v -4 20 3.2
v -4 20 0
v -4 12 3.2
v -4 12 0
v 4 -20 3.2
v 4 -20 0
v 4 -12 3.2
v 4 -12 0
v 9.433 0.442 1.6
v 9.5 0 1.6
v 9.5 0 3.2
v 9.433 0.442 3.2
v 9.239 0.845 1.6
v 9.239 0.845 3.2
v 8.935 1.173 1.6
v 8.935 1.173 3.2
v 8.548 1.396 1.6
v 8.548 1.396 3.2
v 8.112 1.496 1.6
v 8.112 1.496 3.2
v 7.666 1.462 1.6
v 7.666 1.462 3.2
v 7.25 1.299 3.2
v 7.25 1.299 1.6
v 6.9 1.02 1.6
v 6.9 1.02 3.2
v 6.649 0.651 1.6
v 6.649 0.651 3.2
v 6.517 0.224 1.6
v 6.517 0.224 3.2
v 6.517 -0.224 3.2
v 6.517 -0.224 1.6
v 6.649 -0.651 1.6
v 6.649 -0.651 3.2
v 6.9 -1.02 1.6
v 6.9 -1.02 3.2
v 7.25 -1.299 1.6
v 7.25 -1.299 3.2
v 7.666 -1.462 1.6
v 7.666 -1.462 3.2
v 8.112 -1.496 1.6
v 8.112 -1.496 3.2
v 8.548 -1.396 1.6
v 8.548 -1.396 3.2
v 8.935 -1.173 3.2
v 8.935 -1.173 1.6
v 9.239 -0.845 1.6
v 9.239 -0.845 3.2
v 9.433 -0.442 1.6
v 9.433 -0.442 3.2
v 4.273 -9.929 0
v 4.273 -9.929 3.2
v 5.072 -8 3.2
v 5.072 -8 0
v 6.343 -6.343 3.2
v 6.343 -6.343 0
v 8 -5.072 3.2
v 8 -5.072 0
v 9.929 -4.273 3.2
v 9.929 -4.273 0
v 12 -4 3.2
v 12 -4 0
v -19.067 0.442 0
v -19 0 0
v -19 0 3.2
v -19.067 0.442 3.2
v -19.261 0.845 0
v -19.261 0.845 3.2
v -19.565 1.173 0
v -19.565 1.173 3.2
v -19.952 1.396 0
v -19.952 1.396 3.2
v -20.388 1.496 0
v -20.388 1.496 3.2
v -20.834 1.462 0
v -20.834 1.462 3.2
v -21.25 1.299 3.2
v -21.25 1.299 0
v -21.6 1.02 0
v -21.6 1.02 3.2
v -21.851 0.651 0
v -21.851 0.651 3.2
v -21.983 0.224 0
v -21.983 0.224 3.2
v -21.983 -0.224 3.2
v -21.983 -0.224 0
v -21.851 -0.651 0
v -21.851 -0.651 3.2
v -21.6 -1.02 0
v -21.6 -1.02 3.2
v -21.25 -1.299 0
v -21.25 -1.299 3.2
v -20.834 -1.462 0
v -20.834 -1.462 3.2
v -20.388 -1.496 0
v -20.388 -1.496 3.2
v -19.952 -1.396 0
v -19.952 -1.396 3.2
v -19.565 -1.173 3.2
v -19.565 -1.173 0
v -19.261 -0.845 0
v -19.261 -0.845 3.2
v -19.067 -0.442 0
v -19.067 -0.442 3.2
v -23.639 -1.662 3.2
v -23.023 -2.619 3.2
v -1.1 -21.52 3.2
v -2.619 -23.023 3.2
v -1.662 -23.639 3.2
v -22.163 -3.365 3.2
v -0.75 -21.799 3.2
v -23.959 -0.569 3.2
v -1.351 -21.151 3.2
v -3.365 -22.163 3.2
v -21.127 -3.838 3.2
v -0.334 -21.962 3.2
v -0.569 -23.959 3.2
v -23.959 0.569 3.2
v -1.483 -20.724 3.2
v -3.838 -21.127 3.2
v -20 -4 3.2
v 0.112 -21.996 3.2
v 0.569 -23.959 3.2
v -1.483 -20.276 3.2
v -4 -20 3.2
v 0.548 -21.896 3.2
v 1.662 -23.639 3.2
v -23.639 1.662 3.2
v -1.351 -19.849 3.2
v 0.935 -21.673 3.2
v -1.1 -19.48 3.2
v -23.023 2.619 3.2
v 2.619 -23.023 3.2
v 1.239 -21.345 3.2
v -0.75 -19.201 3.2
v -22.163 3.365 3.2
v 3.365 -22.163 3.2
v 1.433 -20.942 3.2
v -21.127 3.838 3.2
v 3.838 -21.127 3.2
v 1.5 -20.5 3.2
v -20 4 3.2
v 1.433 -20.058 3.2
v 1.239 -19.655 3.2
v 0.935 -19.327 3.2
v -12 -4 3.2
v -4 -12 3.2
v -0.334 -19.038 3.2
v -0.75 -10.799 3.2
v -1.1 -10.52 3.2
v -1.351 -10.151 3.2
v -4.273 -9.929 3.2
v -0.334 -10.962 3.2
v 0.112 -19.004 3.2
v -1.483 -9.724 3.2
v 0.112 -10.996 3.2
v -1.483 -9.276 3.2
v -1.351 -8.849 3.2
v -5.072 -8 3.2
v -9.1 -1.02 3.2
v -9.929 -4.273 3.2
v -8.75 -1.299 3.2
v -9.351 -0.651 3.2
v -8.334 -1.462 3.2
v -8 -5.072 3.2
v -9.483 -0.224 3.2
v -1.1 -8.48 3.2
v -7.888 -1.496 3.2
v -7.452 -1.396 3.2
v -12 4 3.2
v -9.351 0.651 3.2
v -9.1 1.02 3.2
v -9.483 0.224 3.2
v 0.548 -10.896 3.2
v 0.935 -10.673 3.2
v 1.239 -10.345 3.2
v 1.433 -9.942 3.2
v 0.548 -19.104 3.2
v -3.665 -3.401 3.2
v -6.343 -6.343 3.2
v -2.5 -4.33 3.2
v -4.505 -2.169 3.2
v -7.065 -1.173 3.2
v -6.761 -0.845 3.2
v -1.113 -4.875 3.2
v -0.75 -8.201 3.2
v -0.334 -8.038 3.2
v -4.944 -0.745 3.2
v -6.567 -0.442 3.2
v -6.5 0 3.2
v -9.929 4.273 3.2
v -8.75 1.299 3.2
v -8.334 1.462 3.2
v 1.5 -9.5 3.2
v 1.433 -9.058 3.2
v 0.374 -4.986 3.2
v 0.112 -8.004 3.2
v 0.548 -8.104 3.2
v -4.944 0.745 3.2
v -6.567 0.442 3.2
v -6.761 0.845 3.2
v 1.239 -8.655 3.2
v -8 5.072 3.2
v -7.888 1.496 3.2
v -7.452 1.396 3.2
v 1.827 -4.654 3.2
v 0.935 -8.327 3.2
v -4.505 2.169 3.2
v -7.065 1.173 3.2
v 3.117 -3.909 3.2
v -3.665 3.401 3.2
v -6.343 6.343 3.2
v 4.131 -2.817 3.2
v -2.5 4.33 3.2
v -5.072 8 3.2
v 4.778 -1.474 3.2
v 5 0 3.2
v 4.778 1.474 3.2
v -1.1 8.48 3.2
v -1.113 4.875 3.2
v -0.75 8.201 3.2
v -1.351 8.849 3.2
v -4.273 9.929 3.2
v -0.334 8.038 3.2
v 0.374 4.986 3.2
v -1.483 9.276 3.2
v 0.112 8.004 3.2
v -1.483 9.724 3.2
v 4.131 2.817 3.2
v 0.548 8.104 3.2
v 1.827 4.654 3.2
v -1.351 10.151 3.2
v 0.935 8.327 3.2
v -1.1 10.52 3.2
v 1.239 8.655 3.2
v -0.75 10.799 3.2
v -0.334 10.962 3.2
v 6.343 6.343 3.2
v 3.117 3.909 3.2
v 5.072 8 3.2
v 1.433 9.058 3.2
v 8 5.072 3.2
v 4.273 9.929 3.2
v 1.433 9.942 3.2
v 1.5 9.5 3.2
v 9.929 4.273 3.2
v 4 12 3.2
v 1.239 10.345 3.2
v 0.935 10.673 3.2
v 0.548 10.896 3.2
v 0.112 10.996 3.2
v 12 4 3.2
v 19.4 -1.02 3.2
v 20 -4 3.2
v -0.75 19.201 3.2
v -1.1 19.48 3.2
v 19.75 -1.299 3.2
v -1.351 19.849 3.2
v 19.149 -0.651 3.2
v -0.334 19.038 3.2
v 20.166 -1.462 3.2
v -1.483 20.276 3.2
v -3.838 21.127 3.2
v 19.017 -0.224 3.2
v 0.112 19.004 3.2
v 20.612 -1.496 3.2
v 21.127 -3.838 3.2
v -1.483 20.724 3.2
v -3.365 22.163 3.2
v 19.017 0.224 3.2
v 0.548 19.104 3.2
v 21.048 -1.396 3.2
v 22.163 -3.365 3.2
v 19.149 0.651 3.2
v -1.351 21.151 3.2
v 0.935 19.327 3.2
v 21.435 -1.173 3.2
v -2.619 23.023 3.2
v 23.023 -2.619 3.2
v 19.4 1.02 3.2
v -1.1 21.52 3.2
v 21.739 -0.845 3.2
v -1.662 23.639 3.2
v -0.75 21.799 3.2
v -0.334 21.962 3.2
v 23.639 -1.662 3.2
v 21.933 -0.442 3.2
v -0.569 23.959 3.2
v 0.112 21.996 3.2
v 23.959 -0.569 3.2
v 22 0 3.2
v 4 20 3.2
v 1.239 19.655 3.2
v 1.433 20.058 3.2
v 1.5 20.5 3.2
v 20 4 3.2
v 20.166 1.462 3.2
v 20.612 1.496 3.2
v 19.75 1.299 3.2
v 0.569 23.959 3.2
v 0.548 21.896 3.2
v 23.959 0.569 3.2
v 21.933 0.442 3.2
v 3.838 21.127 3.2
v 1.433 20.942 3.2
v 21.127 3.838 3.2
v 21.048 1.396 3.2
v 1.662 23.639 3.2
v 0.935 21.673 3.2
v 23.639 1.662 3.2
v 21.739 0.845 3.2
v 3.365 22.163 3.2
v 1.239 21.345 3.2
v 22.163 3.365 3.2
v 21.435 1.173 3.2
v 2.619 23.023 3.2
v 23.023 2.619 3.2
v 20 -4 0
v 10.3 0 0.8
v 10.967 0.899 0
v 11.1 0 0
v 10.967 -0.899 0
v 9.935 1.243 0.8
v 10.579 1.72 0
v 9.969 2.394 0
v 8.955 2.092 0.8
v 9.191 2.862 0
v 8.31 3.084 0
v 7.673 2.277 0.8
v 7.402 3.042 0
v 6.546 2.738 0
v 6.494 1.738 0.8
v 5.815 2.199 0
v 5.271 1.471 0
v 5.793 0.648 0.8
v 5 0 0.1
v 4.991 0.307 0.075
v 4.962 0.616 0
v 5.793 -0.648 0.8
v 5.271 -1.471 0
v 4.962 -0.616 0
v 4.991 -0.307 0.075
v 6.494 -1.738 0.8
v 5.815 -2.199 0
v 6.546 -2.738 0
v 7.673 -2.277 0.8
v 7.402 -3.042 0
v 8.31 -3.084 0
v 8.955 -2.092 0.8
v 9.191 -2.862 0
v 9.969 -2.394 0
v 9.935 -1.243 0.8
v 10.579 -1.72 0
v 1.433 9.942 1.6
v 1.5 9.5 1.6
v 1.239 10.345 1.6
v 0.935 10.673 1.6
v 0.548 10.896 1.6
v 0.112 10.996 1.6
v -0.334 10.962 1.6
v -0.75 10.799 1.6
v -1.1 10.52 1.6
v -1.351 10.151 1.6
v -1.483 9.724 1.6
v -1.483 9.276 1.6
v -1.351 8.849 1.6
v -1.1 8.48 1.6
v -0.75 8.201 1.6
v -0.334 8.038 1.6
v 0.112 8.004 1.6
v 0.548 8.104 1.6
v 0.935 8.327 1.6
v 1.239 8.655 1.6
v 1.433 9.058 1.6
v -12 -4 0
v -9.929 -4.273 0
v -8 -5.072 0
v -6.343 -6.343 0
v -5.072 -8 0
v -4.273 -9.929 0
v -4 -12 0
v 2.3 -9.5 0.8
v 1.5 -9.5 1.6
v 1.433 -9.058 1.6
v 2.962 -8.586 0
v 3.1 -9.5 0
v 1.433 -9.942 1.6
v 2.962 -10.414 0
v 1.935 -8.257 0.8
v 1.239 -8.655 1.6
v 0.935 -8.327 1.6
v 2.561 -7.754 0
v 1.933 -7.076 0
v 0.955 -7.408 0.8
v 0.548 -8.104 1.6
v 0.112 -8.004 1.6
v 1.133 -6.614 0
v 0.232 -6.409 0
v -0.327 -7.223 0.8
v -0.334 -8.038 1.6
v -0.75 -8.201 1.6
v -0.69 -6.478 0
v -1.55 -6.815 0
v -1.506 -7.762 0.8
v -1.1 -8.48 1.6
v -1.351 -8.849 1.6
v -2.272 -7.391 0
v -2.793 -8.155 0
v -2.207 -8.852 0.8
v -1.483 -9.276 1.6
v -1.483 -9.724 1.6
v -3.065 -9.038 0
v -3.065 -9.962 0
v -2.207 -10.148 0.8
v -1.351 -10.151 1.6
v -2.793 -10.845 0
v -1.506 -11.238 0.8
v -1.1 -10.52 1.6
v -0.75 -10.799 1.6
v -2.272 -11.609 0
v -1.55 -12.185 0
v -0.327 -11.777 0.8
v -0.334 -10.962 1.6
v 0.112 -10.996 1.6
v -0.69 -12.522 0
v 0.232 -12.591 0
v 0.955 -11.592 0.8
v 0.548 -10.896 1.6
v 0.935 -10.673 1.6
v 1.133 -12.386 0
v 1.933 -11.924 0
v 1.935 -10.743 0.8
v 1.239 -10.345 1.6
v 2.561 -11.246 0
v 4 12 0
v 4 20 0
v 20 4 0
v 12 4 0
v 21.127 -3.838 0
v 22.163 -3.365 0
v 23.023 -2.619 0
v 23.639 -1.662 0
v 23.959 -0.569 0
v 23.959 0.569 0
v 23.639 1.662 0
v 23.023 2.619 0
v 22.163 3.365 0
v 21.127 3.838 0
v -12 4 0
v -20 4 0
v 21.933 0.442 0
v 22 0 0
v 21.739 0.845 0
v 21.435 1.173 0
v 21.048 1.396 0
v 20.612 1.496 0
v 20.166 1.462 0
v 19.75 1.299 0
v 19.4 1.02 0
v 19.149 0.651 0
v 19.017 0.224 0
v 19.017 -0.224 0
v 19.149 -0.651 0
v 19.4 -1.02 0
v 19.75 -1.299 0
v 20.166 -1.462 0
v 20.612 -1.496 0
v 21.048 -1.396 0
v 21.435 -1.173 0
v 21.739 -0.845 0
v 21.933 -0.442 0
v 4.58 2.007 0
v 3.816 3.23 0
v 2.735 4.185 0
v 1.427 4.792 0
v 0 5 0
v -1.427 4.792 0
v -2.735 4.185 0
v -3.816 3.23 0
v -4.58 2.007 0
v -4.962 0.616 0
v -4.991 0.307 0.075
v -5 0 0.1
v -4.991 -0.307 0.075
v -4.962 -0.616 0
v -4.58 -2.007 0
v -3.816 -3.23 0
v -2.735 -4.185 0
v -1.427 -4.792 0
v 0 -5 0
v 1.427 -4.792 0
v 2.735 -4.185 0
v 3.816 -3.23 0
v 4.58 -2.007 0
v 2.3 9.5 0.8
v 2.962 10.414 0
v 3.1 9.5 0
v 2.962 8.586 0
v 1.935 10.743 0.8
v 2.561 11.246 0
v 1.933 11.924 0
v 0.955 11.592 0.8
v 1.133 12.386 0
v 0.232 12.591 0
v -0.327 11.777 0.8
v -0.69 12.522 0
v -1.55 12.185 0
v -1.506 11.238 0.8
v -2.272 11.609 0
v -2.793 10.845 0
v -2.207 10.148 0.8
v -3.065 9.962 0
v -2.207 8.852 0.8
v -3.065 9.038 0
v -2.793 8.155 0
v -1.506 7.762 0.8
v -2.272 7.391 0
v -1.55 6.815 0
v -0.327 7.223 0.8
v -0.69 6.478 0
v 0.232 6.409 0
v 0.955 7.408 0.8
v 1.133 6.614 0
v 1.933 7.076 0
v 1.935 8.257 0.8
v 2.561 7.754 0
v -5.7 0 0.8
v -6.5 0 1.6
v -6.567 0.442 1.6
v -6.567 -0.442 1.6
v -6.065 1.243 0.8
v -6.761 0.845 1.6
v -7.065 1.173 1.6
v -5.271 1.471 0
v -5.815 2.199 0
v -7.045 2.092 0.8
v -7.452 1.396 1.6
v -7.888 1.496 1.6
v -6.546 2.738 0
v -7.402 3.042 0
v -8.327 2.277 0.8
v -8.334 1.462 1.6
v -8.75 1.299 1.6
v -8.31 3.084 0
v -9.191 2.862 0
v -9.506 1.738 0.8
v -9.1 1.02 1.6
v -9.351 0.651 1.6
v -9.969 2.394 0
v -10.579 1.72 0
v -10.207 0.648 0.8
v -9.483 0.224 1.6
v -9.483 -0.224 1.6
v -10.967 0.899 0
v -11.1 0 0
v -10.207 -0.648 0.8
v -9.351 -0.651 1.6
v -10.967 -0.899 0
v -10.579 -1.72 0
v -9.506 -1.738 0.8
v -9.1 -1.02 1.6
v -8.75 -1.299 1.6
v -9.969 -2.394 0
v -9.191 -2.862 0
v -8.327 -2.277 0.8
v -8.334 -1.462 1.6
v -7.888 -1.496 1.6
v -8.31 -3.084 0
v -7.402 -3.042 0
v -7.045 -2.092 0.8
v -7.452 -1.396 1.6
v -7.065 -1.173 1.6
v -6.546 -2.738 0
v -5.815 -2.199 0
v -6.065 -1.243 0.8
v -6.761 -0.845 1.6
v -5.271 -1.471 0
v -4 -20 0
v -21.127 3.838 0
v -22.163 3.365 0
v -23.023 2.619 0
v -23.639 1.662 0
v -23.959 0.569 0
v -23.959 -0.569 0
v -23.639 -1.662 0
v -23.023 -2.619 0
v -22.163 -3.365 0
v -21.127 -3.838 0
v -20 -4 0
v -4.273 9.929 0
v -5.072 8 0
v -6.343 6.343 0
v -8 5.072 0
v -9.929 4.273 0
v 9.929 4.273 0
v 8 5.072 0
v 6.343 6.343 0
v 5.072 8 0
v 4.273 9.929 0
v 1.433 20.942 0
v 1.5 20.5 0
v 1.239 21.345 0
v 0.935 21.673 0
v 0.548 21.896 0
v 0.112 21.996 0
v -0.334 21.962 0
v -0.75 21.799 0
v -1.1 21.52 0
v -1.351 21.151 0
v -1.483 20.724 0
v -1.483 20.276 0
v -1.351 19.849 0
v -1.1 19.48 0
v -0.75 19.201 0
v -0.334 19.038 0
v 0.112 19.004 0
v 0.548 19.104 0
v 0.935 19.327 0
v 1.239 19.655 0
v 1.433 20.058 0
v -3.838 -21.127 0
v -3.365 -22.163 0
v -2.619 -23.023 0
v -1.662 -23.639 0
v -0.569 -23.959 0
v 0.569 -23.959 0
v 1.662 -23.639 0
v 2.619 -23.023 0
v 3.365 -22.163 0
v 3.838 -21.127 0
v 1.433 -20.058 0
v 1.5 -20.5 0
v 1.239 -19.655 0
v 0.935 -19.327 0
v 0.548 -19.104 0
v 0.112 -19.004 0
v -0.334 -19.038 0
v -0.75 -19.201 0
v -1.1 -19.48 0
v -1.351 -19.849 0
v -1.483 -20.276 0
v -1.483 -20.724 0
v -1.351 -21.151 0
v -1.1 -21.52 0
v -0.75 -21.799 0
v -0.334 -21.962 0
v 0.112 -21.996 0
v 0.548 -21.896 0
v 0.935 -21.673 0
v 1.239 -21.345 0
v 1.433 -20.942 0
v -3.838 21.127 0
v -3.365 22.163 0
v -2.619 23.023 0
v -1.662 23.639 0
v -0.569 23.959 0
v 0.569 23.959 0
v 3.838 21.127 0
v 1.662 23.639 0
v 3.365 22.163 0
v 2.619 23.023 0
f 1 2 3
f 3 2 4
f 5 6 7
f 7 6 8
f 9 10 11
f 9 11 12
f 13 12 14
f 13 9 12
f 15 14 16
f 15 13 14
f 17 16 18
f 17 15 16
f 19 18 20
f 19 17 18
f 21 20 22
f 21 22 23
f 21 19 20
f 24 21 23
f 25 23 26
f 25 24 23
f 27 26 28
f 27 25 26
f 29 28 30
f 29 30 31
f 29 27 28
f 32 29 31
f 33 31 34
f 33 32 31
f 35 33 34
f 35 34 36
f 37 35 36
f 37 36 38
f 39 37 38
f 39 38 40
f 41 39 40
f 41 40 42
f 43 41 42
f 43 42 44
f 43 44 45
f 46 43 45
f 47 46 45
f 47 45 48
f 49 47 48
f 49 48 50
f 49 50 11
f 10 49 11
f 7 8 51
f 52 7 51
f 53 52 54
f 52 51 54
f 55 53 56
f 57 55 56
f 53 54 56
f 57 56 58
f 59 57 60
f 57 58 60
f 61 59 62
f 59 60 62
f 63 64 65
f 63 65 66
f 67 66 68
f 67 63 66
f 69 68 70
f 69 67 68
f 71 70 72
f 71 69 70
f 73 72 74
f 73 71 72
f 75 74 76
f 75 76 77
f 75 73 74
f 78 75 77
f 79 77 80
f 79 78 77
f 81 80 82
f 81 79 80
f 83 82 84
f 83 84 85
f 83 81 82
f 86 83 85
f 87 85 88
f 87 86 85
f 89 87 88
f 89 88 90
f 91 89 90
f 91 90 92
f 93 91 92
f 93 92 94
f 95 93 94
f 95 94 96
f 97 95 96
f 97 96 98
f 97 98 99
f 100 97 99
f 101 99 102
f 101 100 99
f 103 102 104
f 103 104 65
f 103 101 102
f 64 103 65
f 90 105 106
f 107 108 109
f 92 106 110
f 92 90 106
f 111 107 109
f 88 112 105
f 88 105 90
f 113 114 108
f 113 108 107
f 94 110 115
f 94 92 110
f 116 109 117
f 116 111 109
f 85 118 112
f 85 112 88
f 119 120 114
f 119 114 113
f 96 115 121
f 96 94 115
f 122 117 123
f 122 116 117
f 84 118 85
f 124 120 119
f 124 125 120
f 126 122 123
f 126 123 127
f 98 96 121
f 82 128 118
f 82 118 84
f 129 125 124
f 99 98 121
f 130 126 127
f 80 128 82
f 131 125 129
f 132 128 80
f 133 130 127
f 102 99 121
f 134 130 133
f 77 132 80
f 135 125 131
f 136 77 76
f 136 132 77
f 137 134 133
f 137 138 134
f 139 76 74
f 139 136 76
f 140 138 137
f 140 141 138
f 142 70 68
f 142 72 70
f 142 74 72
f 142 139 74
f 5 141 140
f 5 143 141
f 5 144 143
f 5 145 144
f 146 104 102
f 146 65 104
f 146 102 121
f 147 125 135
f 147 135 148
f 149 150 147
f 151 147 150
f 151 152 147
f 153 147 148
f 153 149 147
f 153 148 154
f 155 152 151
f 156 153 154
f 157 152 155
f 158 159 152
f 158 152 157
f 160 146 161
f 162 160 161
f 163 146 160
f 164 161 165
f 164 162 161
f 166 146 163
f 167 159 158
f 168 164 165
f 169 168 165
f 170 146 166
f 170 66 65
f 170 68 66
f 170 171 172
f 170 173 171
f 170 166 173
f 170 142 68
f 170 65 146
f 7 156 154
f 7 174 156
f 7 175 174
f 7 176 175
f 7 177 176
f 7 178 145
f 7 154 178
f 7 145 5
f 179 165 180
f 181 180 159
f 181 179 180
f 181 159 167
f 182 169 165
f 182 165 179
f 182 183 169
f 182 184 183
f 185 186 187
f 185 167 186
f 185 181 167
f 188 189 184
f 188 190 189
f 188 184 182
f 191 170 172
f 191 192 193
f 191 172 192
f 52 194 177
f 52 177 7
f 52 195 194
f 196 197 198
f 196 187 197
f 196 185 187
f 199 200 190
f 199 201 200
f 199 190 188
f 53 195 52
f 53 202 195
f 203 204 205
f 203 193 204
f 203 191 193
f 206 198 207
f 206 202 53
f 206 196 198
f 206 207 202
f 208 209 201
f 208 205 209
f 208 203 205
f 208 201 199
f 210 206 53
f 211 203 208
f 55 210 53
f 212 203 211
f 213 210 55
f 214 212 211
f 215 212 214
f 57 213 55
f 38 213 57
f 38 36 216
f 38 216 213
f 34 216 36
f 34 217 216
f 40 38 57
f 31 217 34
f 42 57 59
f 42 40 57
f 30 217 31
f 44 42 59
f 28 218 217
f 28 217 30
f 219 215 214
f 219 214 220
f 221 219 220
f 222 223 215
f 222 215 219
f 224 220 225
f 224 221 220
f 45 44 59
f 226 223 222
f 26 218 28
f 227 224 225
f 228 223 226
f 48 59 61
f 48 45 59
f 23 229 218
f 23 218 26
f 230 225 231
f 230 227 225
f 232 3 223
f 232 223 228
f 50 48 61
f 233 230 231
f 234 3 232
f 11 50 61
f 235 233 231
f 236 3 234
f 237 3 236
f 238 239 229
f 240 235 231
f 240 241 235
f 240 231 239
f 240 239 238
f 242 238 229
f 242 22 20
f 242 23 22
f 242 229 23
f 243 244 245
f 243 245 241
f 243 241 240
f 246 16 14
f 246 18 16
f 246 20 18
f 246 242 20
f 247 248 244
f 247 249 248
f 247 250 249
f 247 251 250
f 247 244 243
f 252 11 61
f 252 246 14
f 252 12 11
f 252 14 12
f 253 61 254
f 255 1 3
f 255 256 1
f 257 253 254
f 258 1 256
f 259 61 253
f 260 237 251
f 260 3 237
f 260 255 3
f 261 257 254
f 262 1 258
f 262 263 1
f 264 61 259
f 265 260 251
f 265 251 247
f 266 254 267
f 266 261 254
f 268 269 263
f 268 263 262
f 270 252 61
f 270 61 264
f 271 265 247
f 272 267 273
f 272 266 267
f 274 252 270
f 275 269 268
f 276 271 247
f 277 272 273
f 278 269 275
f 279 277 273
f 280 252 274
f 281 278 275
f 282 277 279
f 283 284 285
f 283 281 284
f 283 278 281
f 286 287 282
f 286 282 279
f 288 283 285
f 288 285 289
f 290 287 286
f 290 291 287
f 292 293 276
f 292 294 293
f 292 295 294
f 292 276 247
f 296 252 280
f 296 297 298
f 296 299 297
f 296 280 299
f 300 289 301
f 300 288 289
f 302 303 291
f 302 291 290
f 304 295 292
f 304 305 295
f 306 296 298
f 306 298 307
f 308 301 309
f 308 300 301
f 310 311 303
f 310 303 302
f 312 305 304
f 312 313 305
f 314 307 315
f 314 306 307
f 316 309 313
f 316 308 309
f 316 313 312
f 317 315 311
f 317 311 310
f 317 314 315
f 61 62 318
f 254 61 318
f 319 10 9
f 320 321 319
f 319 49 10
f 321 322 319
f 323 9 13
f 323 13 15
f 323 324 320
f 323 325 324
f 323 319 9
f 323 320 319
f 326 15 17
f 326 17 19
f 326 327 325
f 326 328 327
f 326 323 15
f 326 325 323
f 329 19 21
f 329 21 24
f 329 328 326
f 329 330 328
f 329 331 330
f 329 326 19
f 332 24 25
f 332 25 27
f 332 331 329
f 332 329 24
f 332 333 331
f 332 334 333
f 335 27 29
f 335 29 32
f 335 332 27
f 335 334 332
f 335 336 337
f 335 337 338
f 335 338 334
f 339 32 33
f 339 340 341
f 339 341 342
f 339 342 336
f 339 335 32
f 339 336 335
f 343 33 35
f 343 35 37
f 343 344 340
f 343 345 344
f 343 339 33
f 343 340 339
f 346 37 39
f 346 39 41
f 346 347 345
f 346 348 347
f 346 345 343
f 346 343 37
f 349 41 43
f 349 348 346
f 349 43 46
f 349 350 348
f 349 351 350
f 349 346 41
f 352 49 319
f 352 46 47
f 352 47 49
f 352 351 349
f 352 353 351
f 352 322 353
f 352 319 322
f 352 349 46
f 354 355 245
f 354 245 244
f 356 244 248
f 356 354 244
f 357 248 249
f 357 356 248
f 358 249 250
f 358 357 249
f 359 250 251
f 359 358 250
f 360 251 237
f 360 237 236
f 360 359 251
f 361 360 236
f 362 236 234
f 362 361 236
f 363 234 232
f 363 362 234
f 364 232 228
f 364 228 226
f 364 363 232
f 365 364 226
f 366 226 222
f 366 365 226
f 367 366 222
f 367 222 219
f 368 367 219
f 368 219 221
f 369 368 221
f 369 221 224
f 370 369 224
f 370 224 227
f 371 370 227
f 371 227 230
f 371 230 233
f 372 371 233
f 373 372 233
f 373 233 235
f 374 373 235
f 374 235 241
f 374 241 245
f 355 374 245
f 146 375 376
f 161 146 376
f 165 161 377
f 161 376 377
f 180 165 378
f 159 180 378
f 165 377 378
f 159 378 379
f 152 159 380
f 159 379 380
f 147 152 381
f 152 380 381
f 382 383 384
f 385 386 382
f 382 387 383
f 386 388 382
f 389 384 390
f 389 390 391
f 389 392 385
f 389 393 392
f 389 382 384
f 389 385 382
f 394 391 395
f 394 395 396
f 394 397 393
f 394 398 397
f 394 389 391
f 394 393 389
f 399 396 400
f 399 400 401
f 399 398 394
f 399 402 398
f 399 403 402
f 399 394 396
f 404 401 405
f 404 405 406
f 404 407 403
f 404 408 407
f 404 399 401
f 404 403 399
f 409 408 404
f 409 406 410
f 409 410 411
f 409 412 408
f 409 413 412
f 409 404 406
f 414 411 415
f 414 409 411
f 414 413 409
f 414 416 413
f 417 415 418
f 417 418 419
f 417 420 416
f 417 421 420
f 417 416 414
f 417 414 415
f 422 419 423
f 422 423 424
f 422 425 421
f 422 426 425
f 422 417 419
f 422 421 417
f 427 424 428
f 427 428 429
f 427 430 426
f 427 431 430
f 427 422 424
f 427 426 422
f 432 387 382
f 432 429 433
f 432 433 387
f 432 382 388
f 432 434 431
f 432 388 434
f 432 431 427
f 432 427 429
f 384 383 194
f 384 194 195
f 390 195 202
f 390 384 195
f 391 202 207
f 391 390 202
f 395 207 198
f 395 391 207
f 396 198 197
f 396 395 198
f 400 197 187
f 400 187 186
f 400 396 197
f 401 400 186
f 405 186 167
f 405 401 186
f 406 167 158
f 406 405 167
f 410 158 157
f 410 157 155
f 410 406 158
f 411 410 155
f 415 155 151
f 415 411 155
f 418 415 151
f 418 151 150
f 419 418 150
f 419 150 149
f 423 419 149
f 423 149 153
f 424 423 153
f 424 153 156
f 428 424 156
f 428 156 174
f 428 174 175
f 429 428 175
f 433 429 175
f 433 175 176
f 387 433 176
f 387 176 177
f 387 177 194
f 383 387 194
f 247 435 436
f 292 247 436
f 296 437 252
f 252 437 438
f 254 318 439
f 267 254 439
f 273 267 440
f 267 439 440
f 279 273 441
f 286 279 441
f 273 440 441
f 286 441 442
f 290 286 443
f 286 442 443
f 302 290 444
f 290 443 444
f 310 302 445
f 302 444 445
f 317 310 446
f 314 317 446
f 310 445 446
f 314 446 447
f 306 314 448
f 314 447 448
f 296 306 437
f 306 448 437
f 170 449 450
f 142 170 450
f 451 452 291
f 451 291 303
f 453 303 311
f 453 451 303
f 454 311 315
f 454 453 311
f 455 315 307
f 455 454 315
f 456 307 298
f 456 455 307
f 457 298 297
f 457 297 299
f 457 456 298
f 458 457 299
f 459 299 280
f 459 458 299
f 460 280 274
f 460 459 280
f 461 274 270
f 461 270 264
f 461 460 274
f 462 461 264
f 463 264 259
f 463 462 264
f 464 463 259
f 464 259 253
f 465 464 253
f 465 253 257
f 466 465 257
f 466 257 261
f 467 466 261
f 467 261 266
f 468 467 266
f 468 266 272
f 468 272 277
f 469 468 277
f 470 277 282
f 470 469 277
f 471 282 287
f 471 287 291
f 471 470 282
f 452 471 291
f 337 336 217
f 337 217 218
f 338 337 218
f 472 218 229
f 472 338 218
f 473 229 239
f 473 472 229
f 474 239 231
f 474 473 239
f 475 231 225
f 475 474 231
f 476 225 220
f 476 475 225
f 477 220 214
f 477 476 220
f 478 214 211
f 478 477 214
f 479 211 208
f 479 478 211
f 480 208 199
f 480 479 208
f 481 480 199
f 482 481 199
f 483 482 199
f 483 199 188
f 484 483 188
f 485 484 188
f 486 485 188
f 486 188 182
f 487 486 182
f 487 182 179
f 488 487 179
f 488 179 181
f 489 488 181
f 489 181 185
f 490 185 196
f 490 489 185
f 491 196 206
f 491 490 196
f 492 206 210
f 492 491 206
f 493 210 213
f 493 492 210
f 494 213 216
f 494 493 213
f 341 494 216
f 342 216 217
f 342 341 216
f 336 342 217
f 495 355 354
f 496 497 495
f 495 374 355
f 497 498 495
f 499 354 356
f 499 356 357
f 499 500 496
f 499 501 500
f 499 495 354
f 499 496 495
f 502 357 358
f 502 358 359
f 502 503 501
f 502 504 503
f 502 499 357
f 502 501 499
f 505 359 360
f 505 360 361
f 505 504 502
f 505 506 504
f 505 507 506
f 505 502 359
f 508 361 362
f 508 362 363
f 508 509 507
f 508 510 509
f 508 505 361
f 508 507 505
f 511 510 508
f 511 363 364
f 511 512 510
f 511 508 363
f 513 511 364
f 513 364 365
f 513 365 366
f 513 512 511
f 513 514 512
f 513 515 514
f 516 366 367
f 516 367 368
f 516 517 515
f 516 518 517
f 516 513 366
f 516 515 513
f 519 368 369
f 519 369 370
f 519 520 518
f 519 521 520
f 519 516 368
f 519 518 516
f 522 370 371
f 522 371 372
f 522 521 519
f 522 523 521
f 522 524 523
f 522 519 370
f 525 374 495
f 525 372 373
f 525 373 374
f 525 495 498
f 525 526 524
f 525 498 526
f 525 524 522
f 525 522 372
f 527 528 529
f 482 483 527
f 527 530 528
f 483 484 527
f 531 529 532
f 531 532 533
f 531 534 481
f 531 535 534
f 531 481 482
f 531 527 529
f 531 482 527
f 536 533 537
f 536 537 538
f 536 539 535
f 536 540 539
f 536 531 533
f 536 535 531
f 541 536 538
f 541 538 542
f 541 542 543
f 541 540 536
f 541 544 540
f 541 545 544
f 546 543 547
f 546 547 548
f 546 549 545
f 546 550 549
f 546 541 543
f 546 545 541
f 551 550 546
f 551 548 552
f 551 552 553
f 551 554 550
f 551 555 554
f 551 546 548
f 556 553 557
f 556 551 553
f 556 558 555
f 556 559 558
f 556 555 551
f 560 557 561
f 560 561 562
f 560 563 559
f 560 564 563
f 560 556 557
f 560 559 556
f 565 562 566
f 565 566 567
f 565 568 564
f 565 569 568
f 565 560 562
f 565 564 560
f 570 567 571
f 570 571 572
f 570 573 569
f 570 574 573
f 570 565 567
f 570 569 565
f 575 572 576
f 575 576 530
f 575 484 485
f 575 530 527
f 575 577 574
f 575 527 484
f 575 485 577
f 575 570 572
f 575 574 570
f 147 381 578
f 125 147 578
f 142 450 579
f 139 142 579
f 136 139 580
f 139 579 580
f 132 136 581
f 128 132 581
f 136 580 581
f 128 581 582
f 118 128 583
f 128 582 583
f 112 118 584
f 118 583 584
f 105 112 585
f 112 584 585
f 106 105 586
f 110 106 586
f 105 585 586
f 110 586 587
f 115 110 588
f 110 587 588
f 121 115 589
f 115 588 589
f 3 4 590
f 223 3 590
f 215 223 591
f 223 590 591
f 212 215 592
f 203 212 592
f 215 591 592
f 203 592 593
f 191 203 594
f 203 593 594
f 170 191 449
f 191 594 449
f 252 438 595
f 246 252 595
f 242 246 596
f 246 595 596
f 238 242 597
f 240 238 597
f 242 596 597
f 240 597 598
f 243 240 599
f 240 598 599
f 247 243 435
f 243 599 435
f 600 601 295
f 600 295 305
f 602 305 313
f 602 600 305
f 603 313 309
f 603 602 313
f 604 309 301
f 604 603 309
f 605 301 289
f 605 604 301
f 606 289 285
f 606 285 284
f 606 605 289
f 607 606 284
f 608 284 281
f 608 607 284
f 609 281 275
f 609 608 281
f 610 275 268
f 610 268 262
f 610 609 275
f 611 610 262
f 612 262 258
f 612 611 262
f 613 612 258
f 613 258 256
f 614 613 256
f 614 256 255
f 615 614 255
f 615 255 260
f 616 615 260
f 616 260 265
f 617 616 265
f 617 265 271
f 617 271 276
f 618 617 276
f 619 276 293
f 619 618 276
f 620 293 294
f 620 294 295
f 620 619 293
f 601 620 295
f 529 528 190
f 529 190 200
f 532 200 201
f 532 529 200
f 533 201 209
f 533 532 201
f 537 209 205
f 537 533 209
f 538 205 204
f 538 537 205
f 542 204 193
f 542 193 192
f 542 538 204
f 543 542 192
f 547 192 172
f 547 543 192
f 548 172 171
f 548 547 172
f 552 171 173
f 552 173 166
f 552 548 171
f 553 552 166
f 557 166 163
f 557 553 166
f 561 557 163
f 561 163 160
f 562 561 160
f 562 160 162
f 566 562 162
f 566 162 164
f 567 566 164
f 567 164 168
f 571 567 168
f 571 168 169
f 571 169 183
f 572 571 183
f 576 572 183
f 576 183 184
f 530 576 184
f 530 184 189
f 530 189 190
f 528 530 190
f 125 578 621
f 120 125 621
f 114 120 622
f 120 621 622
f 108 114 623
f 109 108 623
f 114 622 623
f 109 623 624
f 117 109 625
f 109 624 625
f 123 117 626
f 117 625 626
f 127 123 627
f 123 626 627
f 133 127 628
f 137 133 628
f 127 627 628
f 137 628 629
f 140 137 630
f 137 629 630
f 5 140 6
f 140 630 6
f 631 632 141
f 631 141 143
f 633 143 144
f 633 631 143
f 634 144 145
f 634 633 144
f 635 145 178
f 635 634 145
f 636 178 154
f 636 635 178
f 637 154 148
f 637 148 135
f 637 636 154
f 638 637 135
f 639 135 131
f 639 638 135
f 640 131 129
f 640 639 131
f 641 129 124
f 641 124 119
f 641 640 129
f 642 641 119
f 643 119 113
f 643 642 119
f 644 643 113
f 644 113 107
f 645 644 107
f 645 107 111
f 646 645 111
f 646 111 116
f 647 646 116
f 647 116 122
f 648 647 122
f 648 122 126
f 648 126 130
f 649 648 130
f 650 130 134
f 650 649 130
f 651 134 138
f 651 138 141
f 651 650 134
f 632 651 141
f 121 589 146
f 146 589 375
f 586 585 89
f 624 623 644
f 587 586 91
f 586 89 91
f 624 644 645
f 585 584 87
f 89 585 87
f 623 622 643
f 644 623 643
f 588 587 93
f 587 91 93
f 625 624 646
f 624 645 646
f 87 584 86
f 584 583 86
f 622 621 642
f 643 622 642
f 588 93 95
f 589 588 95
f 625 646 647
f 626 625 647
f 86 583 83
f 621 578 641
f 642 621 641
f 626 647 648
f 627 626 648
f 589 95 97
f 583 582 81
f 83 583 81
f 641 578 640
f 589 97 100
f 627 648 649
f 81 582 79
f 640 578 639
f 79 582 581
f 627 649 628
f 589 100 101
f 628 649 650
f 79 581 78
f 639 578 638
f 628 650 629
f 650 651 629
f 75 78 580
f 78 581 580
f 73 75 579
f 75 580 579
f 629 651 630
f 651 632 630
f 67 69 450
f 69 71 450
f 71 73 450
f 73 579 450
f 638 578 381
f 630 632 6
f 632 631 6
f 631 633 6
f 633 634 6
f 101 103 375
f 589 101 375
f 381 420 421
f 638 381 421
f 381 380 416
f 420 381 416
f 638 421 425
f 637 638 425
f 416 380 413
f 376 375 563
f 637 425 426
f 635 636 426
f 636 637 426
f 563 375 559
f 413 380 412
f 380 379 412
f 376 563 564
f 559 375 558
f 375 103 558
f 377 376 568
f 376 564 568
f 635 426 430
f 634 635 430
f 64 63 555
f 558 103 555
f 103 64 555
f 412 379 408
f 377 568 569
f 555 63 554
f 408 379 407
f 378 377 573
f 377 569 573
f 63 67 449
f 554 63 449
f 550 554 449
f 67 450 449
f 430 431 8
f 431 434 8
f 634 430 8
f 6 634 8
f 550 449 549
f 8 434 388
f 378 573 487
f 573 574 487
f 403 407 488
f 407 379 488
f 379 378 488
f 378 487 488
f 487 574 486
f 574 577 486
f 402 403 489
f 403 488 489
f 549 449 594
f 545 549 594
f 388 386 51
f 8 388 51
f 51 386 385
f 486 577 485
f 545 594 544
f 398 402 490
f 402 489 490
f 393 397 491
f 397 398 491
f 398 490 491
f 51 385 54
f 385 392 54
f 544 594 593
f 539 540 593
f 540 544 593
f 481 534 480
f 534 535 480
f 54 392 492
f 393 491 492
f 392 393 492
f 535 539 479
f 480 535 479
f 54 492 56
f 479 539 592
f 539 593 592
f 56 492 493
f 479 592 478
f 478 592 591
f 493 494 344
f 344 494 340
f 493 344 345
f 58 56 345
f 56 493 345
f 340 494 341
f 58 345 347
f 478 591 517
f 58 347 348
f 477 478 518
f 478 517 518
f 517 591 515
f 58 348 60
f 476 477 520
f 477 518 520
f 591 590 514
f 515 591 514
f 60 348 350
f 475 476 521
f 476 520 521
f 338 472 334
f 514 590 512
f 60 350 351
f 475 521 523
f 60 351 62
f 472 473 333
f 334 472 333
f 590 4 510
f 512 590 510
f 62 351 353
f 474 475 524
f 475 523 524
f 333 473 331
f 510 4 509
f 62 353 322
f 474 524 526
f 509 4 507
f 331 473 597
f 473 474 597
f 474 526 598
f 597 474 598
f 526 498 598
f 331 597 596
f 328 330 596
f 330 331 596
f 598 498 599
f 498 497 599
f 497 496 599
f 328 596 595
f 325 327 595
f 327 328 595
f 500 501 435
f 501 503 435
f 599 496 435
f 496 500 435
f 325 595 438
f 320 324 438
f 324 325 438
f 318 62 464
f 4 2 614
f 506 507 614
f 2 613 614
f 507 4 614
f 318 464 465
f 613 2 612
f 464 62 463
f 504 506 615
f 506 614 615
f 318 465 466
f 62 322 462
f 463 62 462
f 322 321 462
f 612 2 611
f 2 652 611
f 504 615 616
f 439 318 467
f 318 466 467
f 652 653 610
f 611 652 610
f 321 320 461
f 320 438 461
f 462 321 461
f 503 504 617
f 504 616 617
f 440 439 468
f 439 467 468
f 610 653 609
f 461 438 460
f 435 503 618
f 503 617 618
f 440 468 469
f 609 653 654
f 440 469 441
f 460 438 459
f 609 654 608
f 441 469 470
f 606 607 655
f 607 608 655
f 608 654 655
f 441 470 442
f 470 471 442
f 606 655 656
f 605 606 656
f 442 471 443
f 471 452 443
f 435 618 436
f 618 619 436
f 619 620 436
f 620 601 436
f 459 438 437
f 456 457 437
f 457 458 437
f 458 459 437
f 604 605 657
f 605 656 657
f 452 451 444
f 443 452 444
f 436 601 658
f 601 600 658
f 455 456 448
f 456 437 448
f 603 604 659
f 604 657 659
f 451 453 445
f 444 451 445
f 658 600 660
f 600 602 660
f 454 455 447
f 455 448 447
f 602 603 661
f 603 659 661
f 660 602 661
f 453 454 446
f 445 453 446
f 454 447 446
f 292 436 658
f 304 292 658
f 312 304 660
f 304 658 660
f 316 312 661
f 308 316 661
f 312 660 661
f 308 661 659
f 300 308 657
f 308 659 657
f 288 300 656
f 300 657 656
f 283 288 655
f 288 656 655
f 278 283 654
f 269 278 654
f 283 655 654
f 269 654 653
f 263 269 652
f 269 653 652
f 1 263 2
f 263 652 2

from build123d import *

# Parameters (mm, degrees)
SKETCH_1_R      = 5
SKETCH_1_R_2    = 1.5
EXTRUDE_1_DEPTH = 3.2
CHAMFER_1_SIZE  = 1.6


with BuildPart() as part:
    # Эскиз1 → Бобышка-Вытянуть1 (new body)
    with BuildSketch(Plane.XY):
        with BuildLine():
            Line((-4, 20), (-4, 12))
            ThreePointArc((-4, 12), (-6.343145751, 6.343145751), (-12, 4))
            Line((-12, 4), (-20, 4))
            ThreePointArc((-20, 4), (-24, 0), (-20, -4))
            Line((-20, -4), (-12, -4))
            ThreePointArc((-12, -4), (-6.343145751, -6.343145751), (-4, -12))
            Line((-4, -12), (-4, -20))
            ThreePointArc((-4, -20), (0, -24), (4, -20))
            Line((4, -20), (4, -12))
            ThreePointArc((4, -12), (6.343145751, -6.343145751), (12, -4))
            Line((12, -4), (20, -4))
            ThreePointArc((20, -4), (24, 0), (20, 4))
            Line((20, 4), (12, 4))
            ThreePointArc((12, 4), (6.343145751, 6.343145751), (4, 12))
            Line((4, 12), (4, 20))
            ThreePointArc((4, 20), (0, 24), (-4, 20))
        make_face()
        Circle(SKETCH_1_R, mode=Mode.SUBTRACT)
        with Locations((0, 9.5)):
            Circle(SKETCH_1_R_2, mode=Mode.SUBTRACT)
        with Locations((0, -9.5)):
            Circle(SKETCH_1_R_2, mode=Mode.SUBTRACT)
        with Locations((-8, 0)):
            Circle(SKETCH_1_R_2, mode=Mode.SUBTRACT)
        with Locations((8, 0)):
            Circle(SKETCH_1_R_2, mode=Mode.SUBTRACT)
        with Locations((0, 20.5)):
            Circle(SKETCH_1_R_2, mode=Mode.SUBTRACT)
        with Locations((20.5, 0)):
            Circle(SKETCH_1_R_2, mode=Mode.SUBTRACT)
        with Locations((-20.5, 0)):
            Circle(SKETCH_1_R_2, mode=Mode.SUBTRACT)
        with Locations((0, -20.5)):
            Circle(SKETCH_1_R_2, mode=Mode.SUBTRACT)
    extrude(amount=EXTRUDE_1_DEPTH)

    # Фаска1
    # the kernel refuses this chamfer: 1.6 mm, written as the material it takes off along each edge
    with BuildSketch(Plane(origin=(0, 9.5, 0), x_dir=(1, 0, 0), z_dir=(0, -1, 0))) as chamfer_1_piece_1:
        Polygon((1.5, CHAMFER_1_SIZE), (1.5 + CHAMFER_1_SIZE, 0), (1.5, 0), align=None)
    revolve(axis=Axis((0, 9.5, 0), (0, 0, 1)), mode=Mode.SUBTRACT)
    with BuildSketch(Plane(origin=(0, -9.5, 0), x_dir=(1, 0, 0), z_dir=(0, -1, 0))) as chamfer_1_piece_2:
        Polygon((1.5, CHAMFER_1_SIZE), (1.5 + CHAMFER_1_SIZE, 0), (1.5, 0), align=None)
    revolve(axis=Axis((0, -9.5, 0), (0, 0, 1)), mode=Mode.SUBTRACT)
    with BuildSketch(Plane(origin=(-8, 0, 0), x_dir=(1, 0, 0), z_dir=(0, -1, 0))) as chamfer_1_piece_3:
        Polygon((1.5, CHAMFER_1_SIZE), (1.5 + CHAMFER_1_SIZE, 0), (1.5, 0), align=None)
    revolve(axis=Axis((-8, 0, 0), (0, 0, 1)), mode=Mode.SUBTRACT)
    with BuildSketch(Plane(origin=(8, 0, 0), x_dir=(1, 0, 0), z_dir=(0, -1, 0))) as chamfer_1_piece_4:
        Polygon((1.5, CHAMFER_1_SIZE), (1.5 + CHAMFER_1_SIZE, 0), (1.5, 0), align=None)
    revolve(axis=Axis((8, 0, 0), (0, 0, 1)), mode=Mode.SUBTRACT)


solid = part.part
